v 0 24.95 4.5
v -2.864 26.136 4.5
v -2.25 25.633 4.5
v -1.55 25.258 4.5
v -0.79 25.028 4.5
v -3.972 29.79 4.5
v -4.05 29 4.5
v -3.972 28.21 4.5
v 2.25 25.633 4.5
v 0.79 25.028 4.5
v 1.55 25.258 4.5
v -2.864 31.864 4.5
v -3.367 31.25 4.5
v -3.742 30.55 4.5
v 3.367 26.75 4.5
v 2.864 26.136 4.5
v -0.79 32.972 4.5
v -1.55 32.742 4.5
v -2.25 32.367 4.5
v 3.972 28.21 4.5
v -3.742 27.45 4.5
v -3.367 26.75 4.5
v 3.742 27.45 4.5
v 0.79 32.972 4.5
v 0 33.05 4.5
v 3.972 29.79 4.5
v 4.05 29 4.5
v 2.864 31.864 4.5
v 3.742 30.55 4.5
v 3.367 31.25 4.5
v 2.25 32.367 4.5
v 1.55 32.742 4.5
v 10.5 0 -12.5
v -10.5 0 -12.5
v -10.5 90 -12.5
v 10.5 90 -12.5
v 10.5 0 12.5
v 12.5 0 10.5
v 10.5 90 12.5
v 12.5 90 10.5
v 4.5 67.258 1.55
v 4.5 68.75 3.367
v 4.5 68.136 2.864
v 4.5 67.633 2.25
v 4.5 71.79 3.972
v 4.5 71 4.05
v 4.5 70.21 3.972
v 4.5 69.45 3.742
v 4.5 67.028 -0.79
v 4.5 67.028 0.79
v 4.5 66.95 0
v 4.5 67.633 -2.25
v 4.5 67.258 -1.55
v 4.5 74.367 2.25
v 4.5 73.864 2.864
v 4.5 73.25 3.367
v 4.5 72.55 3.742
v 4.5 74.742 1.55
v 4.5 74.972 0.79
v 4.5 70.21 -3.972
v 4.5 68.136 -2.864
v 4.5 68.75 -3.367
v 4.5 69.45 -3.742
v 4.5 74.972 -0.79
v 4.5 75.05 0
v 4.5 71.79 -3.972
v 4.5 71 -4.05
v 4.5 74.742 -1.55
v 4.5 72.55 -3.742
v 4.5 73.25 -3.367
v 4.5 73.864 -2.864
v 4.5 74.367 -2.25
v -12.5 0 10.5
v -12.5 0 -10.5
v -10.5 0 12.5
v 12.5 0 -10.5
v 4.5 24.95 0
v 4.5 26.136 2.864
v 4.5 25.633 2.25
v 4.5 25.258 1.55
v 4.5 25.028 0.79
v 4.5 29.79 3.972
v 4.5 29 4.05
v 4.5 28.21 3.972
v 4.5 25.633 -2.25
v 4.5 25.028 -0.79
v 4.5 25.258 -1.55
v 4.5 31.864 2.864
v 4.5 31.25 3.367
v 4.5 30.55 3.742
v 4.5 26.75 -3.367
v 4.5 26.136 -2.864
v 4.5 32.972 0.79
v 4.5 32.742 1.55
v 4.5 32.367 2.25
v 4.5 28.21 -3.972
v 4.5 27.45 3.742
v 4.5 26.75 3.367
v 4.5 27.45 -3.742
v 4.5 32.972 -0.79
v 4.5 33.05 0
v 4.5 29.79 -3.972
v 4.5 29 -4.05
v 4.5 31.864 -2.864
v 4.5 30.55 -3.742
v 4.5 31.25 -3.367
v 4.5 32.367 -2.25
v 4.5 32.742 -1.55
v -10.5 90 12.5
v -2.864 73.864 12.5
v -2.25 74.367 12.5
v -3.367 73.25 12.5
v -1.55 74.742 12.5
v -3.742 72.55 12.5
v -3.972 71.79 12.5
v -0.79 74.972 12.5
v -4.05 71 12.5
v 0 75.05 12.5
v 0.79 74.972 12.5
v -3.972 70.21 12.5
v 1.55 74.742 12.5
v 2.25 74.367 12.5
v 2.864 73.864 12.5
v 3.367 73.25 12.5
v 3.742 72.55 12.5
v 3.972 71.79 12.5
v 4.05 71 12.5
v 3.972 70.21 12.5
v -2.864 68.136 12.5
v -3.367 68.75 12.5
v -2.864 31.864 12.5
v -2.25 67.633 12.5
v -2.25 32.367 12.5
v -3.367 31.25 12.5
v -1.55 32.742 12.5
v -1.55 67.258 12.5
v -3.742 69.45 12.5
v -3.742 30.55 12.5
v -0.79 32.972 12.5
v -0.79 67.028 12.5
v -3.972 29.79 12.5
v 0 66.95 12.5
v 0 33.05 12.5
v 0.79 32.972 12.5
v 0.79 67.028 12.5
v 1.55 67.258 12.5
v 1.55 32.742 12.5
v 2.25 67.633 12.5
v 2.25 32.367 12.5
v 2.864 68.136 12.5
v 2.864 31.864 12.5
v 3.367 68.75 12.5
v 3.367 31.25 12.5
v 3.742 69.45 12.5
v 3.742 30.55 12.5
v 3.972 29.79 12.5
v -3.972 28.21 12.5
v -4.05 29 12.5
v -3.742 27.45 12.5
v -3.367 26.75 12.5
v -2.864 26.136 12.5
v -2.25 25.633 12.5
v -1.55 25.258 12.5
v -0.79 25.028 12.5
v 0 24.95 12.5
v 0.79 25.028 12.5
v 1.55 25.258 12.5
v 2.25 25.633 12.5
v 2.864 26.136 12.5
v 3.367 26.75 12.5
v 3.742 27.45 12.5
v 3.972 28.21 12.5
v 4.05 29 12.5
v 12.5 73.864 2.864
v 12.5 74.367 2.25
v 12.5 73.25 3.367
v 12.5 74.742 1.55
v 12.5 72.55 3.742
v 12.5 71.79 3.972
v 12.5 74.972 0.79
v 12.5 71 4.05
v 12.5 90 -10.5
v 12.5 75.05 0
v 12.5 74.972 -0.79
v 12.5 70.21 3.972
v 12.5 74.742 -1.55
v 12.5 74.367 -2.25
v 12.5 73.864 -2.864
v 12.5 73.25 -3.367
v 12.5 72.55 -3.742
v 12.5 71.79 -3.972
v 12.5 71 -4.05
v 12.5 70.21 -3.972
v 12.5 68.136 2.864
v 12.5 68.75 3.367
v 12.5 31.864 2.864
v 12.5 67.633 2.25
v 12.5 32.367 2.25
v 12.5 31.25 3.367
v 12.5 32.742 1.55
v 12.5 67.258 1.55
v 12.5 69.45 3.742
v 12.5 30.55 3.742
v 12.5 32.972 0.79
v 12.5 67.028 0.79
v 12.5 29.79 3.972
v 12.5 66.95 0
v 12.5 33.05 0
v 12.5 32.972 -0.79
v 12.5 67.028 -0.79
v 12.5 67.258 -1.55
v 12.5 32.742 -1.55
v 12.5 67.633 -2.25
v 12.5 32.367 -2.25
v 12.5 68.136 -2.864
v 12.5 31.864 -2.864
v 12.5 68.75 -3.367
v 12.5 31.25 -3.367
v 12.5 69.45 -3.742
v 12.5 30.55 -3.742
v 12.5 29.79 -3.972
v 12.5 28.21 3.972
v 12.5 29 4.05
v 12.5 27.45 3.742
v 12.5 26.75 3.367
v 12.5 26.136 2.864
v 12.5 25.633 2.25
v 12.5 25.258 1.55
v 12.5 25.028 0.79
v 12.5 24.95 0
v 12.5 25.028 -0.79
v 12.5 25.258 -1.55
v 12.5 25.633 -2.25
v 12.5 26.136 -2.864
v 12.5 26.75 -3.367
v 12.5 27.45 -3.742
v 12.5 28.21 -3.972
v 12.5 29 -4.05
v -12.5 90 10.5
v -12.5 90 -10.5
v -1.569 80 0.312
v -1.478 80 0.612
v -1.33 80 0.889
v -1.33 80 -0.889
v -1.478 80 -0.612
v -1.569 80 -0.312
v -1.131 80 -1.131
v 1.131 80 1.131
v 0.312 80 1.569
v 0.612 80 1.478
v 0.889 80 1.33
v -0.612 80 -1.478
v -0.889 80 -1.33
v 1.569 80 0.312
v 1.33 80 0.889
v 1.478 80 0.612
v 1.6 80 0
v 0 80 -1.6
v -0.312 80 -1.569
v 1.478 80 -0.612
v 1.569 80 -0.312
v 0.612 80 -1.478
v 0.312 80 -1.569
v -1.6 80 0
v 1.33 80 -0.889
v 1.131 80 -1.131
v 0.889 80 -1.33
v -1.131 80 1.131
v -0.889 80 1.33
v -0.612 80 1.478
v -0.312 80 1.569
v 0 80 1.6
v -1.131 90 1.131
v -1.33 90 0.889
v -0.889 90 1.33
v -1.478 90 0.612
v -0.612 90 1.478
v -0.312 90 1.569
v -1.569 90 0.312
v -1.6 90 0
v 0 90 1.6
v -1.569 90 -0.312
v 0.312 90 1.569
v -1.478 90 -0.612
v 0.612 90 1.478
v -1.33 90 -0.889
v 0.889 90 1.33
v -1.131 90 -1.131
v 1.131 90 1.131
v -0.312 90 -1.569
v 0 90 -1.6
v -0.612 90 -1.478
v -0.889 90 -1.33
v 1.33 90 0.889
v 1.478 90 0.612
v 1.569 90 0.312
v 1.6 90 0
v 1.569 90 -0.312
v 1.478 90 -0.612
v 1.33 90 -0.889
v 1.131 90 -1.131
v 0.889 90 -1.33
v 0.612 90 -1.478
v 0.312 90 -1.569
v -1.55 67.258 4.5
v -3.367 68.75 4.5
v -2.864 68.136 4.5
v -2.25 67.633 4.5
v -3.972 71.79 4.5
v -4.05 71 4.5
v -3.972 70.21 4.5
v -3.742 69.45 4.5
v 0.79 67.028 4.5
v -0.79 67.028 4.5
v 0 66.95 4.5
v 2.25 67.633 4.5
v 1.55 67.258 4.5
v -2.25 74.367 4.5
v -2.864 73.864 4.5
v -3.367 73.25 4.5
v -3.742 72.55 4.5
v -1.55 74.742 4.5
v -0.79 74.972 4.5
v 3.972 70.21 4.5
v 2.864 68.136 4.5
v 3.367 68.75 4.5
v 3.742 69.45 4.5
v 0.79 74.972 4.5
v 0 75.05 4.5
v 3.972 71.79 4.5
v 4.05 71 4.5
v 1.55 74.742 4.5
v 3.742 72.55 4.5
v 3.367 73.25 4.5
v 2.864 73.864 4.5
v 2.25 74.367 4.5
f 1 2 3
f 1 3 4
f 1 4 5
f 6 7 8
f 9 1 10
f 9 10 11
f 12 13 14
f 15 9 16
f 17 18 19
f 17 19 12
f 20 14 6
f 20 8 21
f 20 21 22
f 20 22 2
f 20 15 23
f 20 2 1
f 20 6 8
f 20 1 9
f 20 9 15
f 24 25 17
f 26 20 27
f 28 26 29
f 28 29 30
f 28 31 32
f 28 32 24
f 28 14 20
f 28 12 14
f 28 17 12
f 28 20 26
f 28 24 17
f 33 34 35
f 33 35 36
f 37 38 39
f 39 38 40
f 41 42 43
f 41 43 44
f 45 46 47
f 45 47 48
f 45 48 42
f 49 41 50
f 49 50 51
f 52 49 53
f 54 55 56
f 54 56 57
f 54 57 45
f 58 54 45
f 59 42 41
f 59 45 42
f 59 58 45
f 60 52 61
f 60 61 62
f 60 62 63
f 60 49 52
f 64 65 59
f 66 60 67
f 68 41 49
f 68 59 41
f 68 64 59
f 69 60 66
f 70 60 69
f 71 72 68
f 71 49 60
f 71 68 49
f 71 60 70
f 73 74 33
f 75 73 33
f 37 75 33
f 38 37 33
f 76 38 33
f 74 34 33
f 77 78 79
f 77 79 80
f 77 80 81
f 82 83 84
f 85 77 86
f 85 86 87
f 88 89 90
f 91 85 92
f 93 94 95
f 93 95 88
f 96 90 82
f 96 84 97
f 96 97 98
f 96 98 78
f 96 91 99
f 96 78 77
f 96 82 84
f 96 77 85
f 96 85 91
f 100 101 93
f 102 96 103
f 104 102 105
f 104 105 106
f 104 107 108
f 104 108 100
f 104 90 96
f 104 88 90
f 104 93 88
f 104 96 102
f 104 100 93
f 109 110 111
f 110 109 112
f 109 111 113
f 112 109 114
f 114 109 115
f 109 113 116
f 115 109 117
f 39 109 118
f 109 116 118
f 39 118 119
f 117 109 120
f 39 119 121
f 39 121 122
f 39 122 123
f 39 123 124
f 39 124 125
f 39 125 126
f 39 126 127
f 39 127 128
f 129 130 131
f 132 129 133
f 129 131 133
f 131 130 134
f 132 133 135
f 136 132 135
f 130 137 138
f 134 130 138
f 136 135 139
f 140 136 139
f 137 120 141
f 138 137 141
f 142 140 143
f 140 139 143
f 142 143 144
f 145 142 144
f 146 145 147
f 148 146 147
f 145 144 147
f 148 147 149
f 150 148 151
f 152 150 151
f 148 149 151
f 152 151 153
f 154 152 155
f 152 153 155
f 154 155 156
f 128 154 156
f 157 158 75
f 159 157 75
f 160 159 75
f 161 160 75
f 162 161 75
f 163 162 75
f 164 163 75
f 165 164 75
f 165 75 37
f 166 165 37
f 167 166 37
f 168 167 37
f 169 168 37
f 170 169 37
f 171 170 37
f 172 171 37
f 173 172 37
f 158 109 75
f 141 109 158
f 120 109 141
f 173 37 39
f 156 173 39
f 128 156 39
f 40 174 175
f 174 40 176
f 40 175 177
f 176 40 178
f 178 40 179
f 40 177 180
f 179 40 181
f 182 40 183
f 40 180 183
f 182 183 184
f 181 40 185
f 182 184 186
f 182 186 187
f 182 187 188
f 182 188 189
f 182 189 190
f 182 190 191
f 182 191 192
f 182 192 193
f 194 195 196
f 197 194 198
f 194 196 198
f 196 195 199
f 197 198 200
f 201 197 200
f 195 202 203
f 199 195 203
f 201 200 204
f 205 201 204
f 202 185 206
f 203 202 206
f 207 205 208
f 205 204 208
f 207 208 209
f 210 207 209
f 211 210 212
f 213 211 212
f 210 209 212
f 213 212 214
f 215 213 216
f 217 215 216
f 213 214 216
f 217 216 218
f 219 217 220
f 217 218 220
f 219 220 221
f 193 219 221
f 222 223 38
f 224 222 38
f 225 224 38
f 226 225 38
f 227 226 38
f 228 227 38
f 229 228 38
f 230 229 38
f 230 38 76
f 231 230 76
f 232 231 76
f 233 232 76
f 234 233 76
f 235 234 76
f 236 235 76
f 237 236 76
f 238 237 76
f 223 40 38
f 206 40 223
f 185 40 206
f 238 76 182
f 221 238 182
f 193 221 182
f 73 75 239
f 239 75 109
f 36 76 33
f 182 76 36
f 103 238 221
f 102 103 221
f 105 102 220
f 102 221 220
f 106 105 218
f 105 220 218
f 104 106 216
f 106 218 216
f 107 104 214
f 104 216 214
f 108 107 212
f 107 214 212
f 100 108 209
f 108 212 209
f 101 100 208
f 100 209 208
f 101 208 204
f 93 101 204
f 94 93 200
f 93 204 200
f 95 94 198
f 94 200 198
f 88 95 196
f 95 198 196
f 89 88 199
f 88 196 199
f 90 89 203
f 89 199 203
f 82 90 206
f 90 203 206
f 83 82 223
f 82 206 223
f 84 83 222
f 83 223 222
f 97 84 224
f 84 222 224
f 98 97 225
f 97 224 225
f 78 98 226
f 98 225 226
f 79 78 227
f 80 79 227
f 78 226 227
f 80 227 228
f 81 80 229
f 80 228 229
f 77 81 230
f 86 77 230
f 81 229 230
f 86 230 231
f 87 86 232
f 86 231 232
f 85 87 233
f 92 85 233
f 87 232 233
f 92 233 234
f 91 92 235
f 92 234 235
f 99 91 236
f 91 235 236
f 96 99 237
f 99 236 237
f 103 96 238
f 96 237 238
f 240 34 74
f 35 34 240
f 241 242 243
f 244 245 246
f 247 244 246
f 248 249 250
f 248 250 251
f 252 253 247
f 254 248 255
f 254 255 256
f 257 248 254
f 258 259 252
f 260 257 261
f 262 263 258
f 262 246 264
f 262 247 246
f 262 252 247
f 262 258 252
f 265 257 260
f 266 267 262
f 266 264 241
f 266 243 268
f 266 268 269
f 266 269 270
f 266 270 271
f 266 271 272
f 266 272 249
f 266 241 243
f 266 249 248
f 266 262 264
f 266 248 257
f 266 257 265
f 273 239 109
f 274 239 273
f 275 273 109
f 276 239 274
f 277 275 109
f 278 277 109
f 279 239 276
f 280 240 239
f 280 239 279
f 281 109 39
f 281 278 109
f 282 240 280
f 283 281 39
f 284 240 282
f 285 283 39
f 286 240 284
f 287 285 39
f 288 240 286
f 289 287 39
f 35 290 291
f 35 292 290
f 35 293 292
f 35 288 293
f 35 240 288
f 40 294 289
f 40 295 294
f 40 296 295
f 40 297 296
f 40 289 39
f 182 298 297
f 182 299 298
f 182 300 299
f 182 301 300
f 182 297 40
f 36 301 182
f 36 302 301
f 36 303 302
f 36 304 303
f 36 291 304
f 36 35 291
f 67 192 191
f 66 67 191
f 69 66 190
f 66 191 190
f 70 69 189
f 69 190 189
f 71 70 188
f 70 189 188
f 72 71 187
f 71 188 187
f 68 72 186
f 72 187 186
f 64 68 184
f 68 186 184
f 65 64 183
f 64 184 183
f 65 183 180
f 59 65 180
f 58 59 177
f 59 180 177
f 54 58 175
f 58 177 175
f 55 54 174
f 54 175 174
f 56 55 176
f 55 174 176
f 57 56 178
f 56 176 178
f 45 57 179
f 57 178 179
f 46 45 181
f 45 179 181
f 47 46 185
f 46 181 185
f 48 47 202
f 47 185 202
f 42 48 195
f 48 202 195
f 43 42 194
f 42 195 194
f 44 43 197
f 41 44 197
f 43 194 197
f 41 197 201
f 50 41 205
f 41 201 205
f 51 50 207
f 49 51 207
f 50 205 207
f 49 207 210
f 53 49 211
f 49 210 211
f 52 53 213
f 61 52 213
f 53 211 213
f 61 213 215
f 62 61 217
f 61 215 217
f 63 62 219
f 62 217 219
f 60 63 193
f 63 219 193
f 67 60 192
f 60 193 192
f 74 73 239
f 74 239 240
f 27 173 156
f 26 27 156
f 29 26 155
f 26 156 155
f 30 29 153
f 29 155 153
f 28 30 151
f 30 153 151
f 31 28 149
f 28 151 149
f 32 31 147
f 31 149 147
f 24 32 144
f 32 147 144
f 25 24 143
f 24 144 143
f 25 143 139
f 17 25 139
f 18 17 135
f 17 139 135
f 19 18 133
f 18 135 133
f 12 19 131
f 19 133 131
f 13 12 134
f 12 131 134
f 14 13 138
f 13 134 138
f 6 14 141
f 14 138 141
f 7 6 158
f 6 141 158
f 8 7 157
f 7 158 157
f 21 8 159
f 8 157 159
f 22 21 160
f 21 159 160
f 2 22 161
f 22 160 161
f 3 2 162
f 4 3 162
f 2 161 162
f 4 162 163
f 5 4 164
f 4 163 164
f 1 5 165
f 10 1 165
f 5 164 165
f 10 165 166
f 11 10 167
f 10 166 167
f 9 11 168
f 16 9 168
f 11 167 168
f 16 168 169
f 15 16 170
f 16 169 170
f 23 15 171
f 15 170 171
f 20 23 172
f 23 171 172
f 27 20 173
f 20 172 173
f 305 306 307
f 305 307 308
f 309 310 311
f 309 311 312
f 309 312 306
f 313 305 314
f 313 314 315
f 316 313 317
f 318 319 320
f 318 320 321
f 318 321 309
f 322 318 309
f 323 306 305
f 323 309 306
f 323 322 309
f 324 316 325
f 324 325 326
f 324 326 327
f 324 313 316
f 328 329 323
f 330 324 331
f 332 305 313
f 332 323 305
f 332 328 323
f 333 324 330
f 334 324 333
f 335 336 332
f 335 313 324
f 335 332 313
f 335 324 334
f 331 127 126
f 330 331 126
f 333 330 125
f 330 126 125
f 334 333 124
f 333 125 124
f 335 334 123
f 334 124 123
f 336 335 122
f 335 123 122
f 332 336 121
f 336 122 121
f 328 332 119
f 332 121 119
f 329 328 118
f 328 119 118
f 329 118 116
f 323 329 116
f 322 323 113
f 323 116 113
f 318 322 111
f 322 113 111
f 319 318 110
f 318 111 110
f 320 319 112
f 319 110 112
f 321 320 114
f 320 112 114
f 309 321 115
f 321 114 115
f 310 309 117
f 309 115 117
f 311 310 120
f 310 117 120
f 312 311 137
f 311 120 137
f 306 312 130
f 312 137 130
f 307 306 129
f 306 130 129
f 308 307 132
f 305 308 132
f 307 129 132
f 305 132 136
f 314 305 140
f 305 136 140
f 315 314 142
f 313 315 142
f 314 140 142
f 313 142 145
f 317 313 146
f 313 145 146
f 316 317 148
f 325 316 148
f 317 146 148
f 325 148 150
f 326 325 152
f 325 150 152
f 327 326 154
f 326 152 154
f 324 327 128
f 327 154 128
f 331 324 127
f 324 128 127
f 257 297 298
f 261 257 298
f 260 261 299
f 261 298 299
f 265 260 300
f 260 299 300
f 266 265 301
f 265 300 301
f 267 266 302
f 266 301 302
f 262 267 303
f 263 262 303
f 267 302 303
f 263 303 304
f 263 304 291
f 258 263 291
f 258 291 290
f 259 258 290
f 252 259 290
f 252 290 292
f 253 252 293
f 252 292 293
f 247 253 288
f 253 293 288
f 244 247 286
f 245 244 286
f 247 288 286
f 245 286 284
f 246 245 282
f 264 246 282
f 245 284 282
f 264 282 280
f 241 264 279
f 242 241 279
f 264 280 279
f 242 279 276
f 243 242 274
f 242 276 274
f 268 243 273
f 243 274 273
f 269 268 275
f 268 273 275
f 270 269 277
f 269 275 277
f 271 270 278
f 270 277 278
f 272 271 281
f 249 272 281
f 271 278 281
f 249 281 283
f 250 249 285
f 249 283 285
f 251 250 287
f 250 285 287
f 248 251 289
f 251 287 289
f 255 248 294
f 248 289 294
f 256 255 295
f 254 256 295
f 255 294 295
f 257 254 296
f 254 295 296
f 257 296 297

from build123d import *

# Parameters (mm, degrees)
SKETCH1_W           = 25
SKETCH1_H           = 25
BOSS_EXTRUDE1_DEPTH = 90
SKETCH2_R           = 4.05
CUT_EXTRUDE1_DEPTH  = 8
SKETCH3_R           = 4.05
CUT_EXTRUDE7_DEPTH  = 8
CHAMFER1_SIZE       = 2
SKETCH5_R           = 1.6
CUT_EXTRUDE8_DEPTH  = 10


with BuildPart() as part:
    # Sketch1 → Boss-Extrude1 (new body)
    with BuildSketch(Plane(origin=(0, 0, 0), x_dir=(1, 0, 0), z_dir=(0, 1, 0))):
        Rectangle(SKETCH1_W, SKETCH1_H)
    extrude(amount=BOSS_EXTRUDE1_DEPTH)

    # Sketch2 → Cut-Extrude1 (cut)
    with BuildSketch(Plane(origin=(12.5, 0, 0), x_dir=(0, 0, -1), z_dir=(1, 0, 0))):
        with Locations((0, 71)):
            Circle(SKETCH2_R)
        with Locations((0, 29)):
            Circle(SKETCH2_R)
    extrude(amount=-CUT_EXTRUDE1_DEPTH, mode=Mode.SUBTRACT)

    # Sketch3 → Cut-Extrude7 (cut)
    with BuildSketch(Plane.XY.offset(12.5)):
        with Locations((0, 29)):
            Circle(SKETCH3_R)
        with Locations((0, 71)):
            Circle(SKETCH3_R)
    extrude(amount=-CUT_EXTRUDE7_DEPTH, mode=Mode.SUBTRACT)

    # Chamfer1
    chamfer1_edges = [part.edges().sort_by_distance(p)[0] for p in [
        (12.5, 45, 12.5),
        (-12.5, 45, 12.5),
        (-12.5, 45, -12.5),
        (12.5, 45, -12.5),
    ]]
    chamfer(chamfer1_edges, length=CHAMFER1_SIZE)

    # Sketch5 → Cut-Extrude8 (cut)
    with BuildSketch(Plane(origin=(0, 90, 0), x_dir=(1, 0, 0), z_dir=(0, 1, 0))):
        Circle(SKETCH5_R)
    extrude(amount=-CUT_EXTRUDE8_DEPTH, mode=Mode.SUBTRACT)


solid = part.part
